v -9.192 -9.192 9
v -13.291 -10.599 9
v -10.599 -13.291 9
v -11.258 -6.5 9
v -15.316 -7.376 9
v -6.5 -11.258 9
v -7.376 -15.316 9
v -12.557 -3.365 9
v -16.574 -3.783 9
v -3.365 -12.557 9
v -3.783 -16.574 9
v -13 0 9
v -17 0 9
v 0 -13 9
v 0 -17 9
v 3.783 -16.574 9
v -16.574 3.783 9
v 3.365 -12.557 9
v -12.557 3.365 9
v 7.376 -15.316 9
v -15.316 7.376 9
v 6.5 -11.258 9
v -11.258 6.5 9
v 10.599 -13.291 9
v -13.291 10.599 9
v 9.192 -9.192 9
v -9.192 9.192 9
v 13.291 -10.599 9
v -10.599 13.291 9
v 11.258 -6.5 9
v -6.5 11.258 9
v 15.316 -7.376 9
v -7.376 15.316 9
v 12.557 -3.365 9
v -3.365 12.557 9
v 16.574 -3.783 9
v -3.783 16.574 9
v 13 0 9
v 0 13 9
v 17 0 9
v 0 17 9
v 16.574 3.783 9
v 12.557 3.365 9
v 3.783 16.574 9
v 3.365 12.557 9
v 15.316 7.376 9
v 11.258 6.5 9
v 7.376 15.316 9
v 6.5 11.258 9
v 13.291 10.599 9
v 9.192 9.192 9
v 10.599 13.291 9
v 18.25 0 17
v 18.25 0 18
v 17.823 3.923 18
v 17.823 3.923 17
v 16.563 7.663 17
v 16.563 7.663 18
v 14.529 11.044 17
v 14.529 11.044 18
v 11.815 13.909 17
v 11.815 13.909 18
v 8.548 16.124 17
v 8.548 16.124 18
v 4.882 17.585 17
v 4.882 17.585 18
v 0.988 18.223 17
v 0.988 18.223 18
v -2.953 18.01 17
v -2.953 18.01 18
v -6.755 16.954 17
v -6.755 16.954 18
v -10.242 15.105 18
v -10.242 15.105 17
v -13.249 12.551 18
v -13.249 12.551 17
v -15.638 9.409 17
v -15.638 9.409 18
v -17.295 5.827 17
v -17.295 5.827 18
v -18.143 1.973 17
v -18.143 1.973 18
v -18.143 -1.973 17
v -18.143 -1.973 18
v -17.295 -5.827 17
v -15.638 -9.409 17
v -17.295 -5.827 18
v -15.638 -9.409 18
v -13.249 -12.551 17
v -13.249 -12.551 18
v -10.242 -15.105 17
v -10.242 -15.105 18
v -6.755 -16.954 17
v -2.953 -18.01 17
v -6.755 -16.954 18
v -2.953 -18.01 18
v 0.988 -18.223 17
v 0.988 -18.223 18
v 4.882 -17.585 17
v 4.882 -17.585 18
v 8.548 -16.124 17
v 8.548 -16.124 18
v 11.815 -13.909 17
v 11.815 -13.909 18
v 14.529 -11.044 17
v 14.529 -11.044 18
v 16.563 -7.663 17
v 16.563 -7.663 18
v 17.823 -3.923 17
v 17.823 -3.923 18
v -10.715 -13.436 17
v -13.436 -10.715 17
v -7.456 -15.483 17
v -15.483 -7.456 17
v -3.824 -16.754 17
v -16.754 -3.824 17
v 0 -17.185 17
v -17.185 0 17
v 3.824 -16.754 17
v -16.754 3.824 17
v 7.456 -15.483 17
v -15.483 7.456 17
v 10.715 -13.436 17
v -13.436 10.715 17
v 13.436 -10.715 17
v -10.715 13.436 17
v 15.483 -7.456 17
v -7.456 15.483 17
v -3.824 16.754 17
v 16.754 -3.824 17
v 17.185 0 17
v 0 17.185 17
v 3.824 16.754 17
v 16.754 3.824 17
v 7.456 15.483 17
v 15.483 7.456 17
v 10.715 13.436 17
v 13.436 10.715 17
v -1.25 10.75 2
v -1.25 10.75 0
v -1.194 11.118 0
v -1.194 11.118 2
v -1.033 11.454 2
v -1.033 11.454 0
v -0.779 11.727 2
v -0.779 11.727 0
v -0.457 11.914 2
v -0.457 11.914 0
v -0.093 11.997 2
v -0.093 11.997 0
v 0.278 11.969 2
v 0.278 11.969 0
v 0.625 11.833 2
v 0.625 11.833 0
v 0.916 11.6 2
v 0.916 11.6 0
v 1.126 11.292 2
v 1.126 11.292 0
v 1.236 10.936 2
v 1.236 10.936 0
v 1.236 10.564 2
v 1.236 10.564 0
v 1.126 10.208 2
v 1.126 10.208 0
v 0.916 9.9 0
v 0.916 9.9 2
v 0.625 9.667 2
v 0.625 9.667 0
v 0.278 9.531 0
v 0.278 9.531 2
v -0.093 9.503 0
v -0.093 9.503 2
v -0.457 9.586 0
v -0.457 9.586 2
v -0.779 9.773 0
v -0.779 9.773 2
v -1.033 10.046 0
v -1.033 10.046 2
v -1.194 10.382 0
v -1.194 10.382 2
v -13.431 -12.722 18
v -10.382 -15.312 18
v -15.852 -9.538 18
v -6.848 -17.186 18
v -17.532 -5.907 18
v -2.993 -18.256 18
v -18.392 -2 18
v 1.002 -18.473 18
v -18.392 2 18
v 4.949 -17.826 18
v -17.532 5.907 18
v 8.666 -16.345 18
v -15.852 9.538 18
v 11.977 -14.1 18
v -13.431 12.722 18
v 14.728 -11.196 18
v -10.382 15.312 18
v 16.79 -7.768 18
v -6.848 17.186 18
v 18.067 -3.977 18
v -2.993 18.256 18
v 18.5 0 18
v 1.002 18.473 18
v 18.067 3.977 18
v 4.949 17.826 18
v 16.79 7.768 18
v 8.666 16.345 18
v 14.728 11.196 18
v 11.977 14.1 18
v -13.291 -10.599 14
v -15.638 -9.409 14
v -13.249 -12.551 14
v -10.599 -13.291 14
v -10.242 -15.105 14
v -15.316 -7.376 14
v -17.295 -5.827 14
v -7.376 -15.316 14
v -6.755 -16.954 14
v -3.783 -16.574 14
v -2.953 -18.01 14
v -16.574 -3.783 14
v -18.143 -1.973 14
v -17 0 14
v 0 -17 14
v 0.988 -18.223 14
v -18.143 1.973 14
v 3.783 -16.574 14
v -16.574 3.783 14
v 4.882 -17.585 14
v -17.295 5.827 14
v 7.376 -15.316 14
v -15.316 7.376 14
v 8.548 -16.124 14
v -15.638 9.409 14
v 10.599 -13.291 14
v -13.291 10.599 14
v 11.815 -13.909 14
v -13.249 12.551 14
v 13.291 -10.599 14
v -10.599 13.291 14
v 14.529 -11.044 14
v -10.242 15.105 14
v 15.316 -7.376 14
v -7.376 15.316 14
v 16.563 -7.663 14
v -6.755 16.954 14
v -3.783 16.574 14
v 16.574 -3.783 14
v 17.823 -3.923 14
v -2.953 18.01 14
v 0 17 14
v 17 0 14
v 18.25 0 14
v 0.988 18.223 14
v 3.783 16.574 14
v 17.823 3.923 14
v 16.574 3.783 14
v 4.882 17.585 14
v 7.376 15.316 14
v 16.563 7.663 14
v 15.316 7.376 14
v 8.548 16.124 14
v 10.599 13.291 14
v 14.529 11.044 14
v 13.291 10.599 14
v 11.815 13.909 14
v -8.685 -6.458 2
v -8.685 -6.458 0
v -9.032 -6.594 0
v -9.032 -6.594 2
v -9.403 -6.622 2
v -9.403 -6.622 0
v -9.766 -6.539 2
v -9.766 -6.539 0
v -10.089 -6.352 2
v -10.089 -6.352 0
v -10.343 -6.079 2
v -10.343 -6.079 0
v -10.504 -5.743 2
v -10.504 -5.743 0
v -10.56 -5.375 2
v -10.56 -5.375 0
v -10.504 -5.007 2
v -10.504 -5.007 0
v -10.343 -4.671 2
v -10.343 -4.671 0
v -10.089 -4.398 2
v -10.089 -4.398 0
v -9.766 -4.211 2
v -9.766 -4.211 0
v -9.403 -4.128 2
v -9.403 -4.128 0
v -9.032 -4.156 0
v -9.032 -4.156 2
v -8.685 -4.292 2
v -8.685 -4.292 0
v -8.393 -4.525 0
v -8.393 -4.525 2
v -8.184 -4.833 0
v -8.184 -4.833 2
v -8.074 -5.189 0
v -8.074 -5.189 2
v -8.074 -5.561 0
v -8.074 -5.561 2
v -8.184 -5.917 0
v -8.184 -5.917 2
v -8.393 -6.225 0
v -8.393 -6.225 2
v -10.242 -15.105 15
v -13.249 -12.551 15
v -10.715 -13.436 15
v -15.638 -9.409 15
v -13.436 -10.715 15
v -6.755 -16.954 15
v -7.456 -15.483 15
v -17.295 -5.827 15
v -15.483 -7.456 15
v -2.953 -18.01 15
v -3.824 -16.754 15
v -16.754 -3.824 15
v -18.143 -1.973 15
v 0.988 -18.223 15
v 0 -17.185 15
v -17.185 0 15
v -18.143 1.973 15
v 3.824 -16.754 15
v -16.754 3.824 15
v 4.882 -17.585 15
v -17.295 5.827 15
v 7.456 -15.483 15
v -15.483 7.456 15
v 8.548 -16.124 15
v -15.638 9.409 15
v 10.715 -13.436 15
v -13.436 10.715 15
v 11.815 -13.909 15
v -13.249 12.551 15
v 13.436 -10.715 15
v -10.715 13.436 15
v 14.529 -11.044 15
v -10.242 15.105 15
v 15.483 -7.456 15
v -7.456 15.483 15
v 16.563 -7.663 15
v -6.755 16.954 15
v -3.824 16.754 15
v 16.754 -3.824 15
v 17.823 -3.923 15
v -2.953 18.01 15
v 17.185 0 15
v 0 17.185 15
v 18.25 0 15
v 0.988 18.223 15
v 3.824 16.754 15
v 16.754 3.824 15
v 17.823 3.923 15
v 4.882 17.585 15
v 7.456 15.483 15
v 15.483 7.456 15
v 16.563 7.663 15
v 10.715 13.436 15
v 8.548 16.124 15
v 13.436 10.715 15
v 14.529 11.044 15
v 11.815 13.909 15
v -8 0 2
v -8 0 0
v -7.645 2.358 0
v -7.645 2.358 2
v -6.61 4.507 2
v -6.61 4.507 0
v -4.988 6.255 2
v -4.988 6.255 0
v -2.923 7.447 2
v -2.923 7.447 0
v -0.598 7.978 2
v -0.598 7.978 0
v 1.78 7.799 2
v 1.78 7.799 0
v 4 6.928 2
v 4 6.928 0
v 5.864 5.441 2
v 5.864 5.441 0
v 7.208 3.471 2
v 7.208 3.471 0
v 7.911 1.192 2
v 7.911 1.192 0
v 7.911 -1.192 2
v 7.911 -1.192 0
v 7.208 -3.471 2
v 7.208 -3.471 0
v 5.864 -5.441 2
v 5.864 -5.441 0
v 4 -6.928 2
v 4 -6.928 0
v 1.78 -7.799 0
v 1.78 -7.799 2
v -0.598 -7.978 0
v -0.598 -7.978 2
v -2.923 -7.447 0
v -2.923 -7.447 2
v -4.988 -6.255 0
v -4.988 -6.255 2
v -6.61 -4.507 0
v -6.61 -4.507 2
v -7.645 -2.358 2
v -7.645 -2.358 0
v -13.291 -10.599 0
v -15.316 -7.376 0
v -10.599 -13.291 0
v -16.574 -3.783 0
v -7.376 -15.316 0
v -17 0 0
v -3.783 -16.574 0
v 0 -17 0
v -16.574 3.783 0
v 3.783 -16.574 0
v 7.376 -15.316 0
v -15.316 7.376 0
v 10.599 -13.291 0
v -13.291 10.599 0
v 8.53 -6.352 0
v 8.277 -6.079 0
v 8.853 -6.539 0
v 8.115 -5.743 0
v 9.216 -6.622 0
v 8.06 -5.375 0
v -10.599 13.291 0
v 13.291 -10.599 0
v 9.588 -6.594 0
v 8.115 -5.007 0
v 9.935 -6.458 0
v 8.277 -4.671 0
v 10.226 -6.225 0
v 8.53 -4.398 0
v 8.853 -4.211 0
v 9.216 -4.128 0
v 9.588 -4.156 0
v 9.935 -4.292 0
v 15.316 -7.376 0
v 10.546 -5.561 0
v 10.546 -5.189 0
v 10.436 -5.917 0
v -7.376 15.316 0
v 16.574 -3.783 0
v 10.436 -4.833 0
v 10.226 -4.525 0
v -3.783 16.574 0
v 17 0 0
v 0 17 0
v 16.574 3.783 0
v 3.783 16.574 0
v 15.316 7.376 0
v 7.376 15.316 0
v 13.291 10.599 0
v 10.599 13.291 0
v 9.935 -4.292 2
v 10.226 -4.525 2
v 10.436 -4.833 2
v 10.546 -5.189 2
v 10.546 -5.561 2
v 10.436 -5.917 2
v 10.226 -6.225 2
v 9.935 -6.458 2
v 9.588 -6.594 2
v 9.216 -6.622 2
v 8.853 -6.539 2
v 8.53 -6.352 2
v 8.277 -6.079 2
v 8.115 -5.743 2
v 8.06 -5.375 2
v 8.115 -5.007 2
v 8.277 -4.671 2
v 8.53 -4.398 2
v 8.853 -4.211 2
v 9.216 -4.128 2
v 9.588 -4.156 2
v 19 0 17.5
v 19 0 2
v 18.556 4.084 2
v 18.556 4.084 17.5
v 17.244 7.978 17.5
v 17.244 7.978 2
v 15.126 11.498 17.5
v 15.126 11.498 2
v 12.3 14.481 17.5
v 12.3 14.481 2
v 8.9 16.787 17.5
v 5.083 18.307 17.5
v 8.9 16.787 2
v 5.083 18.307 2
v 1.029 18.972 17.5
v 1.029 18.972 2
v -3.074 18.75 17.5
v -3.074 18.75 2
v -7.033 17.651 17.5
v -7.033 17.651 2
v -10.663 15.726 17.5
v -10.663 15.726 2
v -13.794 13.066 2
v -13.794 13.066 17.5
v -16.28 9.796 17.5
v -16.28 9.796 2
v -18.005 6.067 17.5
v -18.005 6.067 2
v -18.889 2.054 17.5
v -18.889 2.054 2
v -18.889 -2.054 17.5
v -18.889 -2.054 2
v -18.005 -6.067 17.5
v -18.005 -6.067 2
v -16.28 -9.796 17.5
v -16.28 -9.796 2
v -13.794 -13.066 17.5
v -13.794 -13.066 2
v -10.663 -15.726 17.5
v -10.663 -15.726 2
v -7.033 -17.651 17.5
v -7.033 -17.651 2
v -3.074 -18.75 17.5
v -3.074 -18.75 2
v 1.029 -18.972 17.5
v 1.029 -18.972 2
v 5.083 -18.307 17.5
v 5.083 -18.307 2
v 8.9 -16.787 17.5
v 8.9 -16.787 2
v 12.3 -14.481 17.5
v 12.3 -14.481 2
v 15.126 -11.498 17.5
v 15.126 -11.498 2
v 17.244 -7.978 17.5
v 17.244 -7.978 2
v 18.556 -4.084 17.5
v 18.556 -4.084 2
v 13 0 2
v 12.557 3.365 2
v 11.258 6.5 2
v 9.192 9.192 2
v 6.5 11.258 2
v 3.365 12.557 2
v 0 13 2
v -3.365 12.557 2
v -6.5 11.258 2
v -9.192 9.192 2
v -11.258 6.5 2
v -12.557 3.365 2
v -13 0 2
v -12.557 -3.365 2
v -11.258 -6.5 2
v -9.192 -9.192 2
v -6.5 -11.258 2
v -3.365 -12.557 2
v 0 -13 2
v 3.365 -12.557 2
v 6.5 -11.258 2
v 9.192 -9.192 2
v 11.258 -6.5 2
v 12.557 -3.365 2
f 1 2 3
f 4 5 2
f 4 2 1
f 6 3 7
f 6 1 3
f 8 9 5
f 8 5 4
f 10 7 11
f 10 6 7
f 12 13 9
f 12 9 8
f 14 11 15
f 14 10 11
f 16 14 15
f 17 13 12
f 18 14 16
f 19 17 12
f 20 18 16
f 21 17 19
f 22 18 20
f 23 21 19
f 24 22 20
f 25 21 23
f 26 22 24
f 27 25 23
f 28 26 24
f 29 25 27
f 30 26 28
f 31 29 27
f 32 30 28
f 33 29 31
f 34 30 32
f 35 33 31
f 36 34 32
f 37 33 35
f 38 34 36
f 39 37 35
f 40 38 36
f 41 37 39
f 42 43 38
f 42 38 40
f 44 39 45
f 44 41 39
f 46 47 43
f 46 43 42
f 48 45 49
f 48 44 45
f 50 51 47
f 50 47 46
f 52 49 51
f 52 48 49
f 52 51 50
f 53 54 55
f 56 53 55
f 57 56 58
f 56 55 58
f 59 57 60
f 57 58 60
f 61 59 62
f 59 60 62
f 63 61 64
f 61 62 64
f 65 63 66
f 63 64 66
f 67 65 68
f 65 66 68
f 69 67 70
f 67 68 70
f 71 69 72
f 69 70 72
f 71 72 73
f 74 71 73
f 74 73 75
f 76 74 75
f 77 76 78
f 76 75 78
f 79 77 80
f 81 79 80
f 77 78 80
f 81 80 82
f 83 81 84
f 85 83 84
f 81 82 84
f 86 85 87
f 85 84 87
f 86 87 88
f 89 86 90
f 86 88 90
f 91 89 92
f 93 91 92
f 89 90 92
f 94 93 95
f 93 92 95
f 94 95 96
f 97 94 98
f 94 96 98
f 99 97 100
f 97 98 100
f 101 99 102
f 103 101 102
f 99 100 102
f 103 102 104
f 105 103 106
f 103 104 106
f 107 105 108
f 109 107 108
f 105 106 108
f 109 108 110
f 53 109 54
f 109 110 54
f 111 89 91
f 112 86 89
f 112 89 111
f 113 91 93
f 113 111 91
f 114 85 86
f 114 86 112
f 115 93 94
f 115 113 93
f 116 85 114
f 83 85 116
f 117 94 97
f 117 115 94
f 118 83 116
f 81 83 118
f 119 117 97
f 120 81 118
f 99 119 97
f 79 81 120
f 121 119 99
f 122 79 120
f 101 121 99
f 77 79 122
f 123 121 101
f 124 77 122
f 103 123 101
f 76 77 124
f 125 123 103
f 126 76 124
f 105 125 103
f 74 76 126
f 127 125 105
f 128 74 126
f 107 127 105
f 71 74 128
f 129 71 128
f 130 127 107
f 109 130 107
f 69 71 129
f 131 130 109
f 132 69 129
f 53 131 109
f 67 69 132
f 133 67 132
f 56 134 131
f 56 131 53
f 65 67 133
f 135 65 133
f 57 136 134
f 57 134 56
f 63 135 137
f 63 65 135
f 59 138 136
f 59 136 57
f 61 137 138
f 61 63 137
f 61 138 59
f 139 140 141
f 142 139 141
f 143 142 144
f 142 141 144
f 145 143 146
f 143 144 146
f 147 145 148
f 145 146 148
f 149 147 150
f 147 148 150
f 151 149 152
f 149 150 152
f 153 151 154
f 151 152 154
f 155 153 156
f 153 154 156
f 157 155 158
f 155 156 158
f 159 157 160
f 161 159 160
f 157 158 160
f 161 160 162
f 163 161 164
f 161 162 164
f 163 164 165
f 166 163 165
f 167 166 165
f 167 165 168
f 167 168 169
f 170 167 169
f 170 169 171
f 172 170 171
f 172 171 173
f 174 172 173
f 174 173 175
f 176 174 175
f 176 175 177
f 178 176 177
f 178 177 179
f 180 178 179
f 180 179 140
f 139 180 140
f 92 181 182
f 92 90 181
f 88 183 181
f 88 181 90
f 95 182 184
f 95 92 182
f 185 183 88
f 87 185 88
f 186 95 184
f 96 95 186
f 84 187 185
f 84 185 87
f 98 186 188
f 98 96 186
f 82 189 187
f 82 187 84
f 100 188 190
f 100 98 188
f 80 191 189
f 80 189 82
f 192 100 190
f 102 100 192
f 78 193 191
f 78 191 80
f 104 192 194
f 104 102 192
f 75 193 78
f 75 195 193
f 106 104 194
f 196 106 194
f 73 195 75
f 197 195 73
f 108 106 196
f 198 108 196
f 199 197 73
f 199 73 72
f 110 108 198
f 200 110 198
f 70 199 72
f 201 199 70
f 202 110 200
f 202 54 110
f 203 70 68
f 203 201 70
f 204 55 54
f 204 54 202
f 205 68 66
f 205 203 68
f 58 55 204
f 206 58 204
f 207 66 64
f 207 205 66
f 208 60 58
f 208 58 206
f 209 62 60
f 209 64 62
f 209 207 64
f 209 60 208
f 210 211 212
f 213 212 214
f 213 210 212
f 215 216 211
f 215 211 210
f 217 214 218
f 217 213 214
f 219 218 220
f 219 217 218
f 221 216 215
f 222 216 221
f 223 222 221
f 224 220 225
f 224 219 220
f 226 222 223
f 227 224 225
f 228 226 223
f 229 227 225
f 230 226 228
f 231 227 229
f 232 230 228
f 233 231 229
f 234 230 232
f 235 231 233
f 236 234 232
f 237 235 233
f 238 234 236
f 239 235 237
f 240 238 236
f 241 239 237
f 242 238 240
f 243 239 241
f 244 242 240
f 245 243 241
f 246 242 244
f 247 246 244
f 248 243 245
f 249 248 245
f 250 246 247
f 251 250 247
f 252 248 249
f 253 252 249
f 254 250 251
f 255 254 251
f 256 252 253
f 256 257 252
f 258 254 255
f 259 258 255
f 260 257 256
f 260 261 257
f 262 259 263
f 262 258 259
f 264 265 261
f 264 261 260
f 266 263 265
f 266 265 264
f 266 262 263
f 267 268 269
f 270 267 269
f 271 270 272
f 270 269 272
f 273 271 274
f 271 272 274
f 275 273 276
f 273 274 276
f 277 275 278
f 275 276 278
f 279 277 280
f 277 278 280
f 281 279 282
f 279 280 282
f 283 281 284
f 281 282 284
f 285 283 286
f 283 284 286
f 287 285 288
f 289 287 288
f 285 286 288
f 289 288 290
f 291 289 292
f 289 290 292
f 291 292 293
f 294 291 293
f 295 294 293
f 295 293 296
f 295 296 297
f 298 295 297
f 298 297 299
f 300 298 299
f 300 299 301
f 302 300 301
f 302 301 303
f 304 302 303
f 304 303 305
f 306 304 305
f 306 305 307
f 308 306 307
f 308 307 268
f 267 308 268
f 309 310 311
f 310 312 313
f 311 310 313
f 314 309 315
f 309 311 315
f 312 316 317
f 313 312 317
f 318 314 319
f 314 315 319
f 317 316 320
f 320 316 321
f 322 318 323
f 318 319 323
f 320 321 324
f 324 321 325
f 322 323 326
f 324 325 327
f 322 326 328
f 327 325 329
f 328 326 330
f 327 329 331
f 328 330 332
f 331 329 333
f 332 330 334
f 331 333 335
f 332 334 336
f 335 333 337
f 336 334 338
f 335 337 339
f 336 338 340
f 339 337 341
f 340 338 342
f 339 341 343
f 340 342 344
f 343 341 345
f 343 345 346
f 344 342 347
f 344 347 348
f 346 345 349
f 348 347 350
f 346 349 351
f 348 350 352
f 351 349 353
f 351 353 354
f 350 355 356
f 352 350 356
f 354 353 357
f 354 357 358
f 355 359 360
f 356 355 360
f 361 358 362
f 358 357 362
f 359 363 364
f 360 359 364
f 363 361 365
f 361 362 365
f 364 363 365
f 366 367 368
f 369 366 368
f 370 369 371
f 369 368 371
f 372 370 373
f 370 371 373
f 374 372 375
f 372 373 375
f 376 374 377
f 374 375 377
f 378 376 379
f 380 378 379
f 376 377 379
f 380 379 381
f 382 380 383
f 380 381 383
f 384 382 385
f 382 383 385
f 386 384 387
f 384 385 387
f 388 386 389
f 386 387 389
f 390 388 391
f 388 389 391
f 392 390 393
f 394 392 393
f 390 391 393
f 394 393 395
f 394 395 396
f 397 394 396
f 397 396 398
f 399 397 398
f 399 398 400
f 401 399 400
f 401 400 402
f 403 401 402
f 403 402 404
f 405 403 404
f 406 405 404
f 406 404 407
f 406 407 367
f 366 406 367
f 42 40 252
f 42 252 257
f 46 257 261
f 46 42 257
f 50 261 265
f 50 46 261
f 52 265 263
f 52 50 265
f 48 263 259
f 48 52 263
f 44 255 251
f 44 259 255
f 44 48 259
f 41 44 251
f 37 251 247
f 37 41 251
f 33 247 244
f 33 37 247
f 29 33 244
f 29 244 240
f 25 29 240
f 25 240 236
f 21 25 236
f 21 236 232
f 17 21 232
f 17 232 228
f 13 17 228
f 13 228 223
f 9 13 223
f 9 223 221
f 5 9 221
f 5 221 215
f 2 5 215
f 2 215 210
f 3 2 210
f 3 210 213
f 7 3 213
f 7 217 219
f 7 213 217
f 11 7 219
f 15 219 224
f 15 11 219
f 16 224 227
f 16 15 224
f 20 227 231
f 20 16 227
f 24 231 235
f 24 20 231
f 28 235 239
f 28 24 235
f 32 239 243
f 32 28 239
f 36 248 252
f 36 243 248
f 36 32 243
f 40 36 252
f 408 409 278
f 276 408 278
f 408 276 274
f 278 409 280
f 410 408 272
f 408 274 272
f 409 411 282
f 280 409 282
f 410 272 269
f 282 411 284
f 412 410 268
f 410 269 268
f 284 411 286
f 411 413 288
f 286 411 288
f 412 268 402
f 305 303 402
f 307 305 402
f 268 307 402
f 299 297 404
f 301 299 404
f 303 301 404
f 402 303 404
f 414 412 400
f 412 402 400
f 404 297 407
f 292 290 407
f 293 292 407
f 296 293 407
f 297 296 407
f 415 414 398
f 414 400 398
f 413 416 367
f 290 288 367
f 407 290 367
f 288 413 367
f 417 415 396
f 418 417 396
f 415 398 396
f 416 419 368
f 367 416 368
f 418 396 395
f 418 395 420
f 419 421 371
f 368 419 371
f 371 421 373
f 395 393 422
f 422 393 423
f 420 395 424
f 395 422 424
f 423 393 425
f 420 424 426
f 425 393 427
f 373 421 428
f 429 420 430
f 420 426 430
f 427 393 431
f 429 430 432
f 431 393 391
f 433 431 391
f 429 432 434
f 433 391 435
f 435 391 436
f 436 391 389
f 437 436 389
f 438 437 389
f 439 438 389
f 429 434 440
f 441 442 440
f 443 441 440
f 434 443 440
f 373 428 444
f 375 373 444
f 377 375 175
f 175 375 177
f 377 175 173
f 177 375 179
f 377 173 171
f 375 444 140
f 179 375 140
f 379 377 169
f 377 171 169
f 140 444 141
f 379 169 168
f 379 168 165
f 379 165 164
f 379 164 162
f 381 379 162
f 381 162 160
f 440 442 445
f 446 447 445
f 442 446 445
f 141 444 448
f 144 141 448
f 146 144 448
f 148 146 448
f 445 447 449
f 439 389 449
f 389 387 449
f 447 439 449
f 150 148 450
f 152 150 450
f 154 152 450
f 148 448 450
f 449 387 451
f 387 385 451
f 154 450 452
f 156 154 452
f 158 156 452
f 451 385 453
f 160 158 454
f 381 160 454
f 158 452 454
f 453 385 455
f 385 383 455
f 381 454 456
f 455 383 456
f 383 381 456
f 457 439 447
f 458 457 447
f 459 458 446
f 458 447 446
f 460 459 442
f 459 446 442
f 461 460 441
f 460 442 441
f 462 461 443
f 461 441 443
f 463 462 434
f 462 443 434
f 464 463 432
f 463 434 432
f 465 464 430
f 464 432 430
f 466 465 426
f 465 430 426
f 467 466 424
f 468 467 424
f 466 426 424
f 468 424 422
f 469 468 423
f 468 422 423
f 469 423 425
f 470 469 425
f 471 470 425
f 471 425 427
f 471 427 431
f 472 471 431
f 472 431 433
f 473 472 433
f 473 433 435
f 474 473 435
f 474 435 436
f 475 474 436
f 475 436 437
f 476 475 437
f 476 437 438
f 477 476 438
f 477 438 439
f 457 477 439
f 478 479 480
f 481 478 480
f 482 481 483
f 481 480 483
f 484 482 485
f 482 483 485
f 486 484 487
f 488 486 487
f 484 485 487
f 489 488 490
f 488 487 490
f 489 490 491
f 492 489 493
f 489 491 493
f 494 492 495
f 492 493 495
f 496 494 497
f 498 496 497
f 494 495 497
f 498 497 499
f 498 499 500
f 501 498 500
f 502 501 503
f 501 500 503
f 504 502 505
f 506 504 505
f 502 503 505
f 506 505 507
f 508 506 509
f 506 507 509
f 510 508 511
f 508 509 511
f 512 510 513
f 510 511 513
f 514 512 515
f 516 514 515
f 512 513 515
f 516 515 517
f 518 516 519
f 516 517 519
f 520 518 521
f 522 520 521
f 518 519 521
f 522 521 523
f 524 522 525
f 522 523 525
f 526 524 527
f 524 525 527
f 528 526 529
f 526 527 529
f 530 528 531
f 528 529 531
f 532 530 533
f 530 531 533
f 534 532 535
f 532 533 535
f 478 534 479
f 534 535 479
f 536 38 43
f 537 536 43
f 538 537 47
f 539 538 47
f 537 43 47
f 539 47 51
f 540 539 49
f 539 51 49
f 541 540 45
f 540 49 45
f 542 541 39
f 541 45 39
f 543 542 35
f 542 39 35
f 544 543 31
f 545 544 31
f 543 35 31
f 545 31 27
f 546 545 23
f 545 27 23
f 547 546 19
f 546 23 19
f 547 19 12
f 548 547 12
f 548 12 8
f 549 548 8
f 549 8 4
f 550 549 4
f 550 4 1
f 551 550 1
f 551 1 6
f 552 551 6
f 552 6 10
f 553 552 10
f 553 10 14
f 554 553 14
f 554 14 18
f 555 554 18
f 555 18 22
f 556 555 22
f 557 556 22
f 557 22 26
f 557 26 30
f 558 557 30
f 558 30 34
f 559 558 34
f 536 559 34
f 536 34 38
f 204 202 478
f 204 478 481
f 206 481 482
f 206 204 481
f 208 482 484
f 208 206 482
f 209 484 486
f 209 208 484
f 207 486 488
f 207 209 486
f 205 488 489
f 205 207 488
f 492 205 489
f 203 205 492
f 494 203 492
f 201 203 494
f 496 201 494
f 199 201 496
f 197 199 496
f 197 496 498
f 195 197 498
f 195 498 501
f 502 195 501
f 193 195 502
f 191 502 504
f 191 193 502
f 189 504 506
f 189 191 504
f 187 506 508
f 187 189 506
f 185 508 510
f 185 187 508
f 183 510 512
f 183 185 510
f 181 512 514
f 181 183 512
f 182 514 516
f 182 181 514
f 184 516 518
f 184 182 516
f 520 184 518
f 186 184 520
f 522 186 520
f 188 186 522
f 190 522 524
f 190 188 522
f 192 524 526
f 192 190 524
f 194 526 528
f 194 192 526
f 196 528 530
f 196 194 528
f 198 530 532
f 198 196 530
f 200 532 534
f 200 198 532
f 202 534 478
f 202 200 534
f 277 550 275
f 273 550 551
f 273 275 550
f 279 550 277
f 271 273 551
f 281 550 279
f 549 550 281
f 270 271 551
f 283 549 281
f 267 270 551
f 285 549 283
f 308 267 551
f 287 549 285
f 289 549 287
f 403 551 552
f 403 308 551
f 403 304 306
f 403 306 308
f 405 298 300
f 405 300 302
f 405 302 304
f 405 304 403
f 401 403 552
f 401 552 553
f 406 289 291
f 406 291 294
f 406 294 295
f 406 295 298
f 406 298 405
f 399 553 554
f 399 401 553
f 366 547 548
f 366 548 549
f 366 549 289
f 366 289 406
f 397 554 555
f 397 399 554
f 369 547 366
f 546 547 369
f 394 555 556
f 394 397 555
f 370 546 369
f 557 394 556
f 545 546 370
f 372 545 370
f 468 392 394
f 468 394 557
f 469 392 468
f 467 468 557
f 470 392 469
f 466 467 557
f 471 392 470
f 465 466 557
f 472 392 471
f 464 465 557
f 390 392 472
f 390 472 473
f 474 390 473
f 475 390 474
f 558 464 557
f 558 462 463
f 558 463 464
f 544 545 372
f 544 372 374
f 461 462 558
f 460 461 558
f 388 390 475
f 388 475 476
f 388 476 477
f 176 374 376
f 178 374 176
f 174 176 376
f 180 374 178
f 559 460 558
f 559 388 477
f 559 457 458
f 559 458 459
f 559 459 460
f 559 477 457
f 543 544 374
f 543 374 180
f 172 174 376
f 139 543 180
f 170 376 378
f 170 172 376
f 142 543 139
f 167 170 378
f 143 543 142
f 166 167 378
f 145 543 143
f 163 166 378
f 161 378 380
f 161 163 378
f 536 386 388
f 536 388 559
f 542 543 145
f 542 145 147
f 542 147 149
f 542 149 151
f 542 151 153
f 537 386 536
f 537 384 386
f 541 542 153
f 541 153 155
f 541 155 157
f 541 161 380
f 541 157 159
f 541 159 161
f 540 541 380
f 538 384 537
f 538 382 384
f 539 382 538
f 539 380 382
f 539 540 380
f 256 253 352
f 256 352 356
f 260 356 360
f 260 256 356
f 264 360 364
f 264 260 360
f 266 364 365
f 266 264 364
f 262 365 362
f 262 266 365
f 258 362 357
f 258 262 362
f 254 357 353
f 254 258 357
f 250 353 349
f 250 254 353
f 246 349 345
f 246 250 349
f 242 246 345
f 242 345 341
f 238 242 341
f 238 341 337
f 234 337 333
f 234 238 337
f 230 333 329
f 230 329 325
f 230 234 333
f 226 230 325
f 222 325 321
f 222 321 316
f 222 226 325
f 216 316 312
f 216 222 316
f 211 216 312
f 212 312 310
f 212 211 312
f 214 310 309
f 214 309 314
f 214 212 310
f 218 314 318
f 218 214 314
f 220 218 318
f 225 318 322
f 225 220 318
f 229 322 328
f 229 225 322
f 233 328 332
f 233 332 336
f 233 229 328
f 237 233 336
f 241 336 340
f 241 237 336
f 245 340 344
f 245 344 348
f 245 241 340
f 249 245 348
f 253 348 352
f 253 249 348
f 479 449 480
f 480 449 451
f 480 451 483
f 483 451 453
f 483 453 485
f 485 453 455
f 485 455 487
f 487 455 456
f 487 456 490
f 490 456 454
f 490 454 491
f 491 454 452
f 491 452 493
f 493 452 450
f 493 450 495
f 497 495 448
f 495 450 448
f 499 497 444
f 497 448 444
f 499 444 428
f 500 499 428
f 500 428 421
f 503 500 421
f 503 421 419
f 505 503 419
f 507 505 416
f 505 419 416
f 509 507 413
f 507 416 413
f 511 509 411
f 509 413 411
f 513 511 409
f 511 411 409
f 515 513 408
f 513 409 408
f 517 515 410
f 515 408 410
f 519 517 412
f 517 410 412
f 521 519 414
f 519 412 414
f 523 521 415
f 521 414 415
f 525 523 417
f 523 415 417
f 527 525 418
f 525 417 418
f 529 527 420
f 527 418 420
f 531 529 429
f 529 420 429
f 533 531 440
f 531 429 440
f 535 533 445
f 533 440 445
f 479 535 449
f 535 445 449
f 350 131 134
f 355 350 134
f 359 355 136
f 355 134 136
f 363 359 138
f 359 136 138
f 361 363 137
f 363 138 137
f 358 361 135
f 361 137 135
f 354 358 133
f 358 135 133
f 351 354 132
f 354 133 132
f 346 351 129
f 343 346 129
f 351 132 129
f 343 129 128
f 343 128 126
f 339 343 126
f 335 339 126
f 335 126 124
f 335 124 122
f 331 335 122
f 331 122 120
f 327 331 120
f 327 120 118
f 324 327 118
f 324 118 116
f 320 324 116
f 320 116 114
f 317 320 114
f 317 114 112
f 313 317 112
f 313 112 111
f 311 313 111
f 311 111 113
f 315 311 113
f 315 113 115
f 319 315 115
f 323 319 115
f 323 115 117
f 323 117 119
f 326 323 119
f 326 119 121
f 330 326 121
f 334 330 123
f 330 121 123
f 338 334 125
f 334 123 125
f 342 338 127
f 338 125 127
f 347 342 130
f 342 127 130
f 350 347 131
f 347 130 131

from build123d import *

# Parameters (mm, degrees)
ESQUISSE1_R                  = 19
BASE_EXTRUSION_DEPTH         = 18
ESQUISSE2_R                  = 13
ENL_V_MAT_EXTRU_1_DEPTH      = 14
ESQUISSE3_R                  = 8
ENL_V_MAT_EXTRU_2_DEPTH      = 19
ESQUISSE4_R                  = 1.25
ENL_V_MAT_EXTRU_3_DEPTH      = 19
R_P_TITION_CIRCULAIRE1_COUNT = 3
ESQUISSE5_R                  = 13
ENL_V_MAT_EXTRU_4_DEPTH      = 2
ESQUISSE6_R                  = 18.25
ENL_V_MAT_EXTRU_5_DEPTH      = 1
ESQUISSE7_R                  = 17
ENL_V_MAT_EXTRU_6_DEPTH      = 10
ESQUISSE8_R                  = 17.185
ENL_V_MAT_EXTRU_7_DEPTH      = 4
ESQUISSE9_R                  = 18.25
ENL_V_MAT_EXTRU_8_DEPTH      = 1
CHANFREIN1_SIZE              = 2
CHANFREIN2_SIZE              = 0.5


with BuildPart() as part:
    # Esquisse1 → Base-Extrusion (new body)
    with BuildSketch(Plane.XY):
        Circle(ESQUISSE1_R)
    extrude(amount=BASE_EXTRUSION_DEPTH)

    # Esquisse2 → Enlèv. mat.-Extru.1 (cut)
    with BuildSketch(Plane.XY.offset(18)):
        Circle(ESQUISSE2_R)
    extrude(amount=-ENL_V_MAT_EXTRU_1_DEPTH, mode=Mode.SUBTRACT)

    # Esquisse3 → Enlèv. mat.-Extru.2 (cut, through all)
    with BuildSketch(Plane(origin=(0, 0, 0), x_dir=(-1, 0, 0), z_dir=(0, 0, -1))):
        Circle(ESQUISSE3_R)
    extrude(amount=-ENL_V_MAT_EXTRU_2_DEPTH, mode=Mode.SUBTRACT)

    # Esquisse4 → Enlèv. mat.-Extru.3 (cut, through all)
    with BuildSketch(Plane(origin=(0, 0, 0), x_dir=(-1, 0, 0), z_dir=(0, 0, -1))):
        with Locations((0, 10.75)):
            Circle(ESQUISSE4_R)
    enl_v_mat_extru_3 = extrude(amount=-ENL_V_MAT_EXTRU_3_DEPTH, mode=Mode.SUBTRACT)

    # Répétition circulaire1: Enlèv. mat.-Extru.3 ×3 about axis
    r_p_tition_circulaire1_axis = Axis((0, 0, 0), (0, 0, -1))
    for i in range(1, R_P_TITION_CIRCULAIRE1_COUNT):
        add(enl_v_mat_extru_3.rotate(r_p_tition_circulaire1_axis, i * 360 / R_P_TITION_CIRCULAIRE1_COUNT), mode=Mode.SUBTRACT)

    # Esquisse5 → Enlèv. mat.-Extru.4 (cut)
    with BuildSketch(Plane.XY.offset(4)):
        Circle(ESQUISSE5_R)
    extrude(amount=-ENL_V_MAT_EXTRU_4_DEPTH, mode=Mode.SUBTRACT)

    # Esquisse6 → Enlèv. mat.-Extru.5 (cut)
    with BuildSketch(Plane.XY.offset(18)):
        Circle(ESQUISSE6_R)
    extrude(amount=-ENL_V_MAT_EXTRU_5_DEPTH, mode=Mode.SUBTRACT)

    # Esquisse7 → Enlèv. mat.-Extru.6 (cut, through all)
    with BuildSketch(Plane.XY.offset(9)):
        Circle(ESQUISSE7_R)
    extrude(amount=ENL_V_MAT_EXTRU_6_DEPTH, mode=Mode.SUBTRACT)

    # Esquisse8 → Enlèv. mat.-Extru.7 (cut)
    with BuildSketch(Plane.XY.offset(18)):
        Circle(ESQUISSE8_R)
    extrude(amount=-ENL_V_MAT_EXTRU_7_DEPTH, mode=Mode.SUBTRACT)

    # Esquisse9 → Enlèv. mat.-Extru.8 (cut)
    with BuildSketch(Plane.XY.offset(14)):
        Circle(ESQUISSE9_R)
    extrude(amount=ENL_V_MAT_EXTRU_8_DEPTH, mode=Mode.SUBTRACT)

    # Chanfrein1
    chanfrein1_edges = [part.edges().sort_by_distance(p)[0] for p in [
        (-19, 0, 0),
    ]]
    chamfer(chanfrein1_edges, length=CHANFREIN1_SIZE)

    # Chanfrein2
    chanfrein2_edges = [part.edges().sort_by_distance(p)[0] for p in [
        (-19, 0, 18),
    ]]
    chamfer(chanfrein2_edges, length=CHANFREIN2_SIZE)


solid = part.part
